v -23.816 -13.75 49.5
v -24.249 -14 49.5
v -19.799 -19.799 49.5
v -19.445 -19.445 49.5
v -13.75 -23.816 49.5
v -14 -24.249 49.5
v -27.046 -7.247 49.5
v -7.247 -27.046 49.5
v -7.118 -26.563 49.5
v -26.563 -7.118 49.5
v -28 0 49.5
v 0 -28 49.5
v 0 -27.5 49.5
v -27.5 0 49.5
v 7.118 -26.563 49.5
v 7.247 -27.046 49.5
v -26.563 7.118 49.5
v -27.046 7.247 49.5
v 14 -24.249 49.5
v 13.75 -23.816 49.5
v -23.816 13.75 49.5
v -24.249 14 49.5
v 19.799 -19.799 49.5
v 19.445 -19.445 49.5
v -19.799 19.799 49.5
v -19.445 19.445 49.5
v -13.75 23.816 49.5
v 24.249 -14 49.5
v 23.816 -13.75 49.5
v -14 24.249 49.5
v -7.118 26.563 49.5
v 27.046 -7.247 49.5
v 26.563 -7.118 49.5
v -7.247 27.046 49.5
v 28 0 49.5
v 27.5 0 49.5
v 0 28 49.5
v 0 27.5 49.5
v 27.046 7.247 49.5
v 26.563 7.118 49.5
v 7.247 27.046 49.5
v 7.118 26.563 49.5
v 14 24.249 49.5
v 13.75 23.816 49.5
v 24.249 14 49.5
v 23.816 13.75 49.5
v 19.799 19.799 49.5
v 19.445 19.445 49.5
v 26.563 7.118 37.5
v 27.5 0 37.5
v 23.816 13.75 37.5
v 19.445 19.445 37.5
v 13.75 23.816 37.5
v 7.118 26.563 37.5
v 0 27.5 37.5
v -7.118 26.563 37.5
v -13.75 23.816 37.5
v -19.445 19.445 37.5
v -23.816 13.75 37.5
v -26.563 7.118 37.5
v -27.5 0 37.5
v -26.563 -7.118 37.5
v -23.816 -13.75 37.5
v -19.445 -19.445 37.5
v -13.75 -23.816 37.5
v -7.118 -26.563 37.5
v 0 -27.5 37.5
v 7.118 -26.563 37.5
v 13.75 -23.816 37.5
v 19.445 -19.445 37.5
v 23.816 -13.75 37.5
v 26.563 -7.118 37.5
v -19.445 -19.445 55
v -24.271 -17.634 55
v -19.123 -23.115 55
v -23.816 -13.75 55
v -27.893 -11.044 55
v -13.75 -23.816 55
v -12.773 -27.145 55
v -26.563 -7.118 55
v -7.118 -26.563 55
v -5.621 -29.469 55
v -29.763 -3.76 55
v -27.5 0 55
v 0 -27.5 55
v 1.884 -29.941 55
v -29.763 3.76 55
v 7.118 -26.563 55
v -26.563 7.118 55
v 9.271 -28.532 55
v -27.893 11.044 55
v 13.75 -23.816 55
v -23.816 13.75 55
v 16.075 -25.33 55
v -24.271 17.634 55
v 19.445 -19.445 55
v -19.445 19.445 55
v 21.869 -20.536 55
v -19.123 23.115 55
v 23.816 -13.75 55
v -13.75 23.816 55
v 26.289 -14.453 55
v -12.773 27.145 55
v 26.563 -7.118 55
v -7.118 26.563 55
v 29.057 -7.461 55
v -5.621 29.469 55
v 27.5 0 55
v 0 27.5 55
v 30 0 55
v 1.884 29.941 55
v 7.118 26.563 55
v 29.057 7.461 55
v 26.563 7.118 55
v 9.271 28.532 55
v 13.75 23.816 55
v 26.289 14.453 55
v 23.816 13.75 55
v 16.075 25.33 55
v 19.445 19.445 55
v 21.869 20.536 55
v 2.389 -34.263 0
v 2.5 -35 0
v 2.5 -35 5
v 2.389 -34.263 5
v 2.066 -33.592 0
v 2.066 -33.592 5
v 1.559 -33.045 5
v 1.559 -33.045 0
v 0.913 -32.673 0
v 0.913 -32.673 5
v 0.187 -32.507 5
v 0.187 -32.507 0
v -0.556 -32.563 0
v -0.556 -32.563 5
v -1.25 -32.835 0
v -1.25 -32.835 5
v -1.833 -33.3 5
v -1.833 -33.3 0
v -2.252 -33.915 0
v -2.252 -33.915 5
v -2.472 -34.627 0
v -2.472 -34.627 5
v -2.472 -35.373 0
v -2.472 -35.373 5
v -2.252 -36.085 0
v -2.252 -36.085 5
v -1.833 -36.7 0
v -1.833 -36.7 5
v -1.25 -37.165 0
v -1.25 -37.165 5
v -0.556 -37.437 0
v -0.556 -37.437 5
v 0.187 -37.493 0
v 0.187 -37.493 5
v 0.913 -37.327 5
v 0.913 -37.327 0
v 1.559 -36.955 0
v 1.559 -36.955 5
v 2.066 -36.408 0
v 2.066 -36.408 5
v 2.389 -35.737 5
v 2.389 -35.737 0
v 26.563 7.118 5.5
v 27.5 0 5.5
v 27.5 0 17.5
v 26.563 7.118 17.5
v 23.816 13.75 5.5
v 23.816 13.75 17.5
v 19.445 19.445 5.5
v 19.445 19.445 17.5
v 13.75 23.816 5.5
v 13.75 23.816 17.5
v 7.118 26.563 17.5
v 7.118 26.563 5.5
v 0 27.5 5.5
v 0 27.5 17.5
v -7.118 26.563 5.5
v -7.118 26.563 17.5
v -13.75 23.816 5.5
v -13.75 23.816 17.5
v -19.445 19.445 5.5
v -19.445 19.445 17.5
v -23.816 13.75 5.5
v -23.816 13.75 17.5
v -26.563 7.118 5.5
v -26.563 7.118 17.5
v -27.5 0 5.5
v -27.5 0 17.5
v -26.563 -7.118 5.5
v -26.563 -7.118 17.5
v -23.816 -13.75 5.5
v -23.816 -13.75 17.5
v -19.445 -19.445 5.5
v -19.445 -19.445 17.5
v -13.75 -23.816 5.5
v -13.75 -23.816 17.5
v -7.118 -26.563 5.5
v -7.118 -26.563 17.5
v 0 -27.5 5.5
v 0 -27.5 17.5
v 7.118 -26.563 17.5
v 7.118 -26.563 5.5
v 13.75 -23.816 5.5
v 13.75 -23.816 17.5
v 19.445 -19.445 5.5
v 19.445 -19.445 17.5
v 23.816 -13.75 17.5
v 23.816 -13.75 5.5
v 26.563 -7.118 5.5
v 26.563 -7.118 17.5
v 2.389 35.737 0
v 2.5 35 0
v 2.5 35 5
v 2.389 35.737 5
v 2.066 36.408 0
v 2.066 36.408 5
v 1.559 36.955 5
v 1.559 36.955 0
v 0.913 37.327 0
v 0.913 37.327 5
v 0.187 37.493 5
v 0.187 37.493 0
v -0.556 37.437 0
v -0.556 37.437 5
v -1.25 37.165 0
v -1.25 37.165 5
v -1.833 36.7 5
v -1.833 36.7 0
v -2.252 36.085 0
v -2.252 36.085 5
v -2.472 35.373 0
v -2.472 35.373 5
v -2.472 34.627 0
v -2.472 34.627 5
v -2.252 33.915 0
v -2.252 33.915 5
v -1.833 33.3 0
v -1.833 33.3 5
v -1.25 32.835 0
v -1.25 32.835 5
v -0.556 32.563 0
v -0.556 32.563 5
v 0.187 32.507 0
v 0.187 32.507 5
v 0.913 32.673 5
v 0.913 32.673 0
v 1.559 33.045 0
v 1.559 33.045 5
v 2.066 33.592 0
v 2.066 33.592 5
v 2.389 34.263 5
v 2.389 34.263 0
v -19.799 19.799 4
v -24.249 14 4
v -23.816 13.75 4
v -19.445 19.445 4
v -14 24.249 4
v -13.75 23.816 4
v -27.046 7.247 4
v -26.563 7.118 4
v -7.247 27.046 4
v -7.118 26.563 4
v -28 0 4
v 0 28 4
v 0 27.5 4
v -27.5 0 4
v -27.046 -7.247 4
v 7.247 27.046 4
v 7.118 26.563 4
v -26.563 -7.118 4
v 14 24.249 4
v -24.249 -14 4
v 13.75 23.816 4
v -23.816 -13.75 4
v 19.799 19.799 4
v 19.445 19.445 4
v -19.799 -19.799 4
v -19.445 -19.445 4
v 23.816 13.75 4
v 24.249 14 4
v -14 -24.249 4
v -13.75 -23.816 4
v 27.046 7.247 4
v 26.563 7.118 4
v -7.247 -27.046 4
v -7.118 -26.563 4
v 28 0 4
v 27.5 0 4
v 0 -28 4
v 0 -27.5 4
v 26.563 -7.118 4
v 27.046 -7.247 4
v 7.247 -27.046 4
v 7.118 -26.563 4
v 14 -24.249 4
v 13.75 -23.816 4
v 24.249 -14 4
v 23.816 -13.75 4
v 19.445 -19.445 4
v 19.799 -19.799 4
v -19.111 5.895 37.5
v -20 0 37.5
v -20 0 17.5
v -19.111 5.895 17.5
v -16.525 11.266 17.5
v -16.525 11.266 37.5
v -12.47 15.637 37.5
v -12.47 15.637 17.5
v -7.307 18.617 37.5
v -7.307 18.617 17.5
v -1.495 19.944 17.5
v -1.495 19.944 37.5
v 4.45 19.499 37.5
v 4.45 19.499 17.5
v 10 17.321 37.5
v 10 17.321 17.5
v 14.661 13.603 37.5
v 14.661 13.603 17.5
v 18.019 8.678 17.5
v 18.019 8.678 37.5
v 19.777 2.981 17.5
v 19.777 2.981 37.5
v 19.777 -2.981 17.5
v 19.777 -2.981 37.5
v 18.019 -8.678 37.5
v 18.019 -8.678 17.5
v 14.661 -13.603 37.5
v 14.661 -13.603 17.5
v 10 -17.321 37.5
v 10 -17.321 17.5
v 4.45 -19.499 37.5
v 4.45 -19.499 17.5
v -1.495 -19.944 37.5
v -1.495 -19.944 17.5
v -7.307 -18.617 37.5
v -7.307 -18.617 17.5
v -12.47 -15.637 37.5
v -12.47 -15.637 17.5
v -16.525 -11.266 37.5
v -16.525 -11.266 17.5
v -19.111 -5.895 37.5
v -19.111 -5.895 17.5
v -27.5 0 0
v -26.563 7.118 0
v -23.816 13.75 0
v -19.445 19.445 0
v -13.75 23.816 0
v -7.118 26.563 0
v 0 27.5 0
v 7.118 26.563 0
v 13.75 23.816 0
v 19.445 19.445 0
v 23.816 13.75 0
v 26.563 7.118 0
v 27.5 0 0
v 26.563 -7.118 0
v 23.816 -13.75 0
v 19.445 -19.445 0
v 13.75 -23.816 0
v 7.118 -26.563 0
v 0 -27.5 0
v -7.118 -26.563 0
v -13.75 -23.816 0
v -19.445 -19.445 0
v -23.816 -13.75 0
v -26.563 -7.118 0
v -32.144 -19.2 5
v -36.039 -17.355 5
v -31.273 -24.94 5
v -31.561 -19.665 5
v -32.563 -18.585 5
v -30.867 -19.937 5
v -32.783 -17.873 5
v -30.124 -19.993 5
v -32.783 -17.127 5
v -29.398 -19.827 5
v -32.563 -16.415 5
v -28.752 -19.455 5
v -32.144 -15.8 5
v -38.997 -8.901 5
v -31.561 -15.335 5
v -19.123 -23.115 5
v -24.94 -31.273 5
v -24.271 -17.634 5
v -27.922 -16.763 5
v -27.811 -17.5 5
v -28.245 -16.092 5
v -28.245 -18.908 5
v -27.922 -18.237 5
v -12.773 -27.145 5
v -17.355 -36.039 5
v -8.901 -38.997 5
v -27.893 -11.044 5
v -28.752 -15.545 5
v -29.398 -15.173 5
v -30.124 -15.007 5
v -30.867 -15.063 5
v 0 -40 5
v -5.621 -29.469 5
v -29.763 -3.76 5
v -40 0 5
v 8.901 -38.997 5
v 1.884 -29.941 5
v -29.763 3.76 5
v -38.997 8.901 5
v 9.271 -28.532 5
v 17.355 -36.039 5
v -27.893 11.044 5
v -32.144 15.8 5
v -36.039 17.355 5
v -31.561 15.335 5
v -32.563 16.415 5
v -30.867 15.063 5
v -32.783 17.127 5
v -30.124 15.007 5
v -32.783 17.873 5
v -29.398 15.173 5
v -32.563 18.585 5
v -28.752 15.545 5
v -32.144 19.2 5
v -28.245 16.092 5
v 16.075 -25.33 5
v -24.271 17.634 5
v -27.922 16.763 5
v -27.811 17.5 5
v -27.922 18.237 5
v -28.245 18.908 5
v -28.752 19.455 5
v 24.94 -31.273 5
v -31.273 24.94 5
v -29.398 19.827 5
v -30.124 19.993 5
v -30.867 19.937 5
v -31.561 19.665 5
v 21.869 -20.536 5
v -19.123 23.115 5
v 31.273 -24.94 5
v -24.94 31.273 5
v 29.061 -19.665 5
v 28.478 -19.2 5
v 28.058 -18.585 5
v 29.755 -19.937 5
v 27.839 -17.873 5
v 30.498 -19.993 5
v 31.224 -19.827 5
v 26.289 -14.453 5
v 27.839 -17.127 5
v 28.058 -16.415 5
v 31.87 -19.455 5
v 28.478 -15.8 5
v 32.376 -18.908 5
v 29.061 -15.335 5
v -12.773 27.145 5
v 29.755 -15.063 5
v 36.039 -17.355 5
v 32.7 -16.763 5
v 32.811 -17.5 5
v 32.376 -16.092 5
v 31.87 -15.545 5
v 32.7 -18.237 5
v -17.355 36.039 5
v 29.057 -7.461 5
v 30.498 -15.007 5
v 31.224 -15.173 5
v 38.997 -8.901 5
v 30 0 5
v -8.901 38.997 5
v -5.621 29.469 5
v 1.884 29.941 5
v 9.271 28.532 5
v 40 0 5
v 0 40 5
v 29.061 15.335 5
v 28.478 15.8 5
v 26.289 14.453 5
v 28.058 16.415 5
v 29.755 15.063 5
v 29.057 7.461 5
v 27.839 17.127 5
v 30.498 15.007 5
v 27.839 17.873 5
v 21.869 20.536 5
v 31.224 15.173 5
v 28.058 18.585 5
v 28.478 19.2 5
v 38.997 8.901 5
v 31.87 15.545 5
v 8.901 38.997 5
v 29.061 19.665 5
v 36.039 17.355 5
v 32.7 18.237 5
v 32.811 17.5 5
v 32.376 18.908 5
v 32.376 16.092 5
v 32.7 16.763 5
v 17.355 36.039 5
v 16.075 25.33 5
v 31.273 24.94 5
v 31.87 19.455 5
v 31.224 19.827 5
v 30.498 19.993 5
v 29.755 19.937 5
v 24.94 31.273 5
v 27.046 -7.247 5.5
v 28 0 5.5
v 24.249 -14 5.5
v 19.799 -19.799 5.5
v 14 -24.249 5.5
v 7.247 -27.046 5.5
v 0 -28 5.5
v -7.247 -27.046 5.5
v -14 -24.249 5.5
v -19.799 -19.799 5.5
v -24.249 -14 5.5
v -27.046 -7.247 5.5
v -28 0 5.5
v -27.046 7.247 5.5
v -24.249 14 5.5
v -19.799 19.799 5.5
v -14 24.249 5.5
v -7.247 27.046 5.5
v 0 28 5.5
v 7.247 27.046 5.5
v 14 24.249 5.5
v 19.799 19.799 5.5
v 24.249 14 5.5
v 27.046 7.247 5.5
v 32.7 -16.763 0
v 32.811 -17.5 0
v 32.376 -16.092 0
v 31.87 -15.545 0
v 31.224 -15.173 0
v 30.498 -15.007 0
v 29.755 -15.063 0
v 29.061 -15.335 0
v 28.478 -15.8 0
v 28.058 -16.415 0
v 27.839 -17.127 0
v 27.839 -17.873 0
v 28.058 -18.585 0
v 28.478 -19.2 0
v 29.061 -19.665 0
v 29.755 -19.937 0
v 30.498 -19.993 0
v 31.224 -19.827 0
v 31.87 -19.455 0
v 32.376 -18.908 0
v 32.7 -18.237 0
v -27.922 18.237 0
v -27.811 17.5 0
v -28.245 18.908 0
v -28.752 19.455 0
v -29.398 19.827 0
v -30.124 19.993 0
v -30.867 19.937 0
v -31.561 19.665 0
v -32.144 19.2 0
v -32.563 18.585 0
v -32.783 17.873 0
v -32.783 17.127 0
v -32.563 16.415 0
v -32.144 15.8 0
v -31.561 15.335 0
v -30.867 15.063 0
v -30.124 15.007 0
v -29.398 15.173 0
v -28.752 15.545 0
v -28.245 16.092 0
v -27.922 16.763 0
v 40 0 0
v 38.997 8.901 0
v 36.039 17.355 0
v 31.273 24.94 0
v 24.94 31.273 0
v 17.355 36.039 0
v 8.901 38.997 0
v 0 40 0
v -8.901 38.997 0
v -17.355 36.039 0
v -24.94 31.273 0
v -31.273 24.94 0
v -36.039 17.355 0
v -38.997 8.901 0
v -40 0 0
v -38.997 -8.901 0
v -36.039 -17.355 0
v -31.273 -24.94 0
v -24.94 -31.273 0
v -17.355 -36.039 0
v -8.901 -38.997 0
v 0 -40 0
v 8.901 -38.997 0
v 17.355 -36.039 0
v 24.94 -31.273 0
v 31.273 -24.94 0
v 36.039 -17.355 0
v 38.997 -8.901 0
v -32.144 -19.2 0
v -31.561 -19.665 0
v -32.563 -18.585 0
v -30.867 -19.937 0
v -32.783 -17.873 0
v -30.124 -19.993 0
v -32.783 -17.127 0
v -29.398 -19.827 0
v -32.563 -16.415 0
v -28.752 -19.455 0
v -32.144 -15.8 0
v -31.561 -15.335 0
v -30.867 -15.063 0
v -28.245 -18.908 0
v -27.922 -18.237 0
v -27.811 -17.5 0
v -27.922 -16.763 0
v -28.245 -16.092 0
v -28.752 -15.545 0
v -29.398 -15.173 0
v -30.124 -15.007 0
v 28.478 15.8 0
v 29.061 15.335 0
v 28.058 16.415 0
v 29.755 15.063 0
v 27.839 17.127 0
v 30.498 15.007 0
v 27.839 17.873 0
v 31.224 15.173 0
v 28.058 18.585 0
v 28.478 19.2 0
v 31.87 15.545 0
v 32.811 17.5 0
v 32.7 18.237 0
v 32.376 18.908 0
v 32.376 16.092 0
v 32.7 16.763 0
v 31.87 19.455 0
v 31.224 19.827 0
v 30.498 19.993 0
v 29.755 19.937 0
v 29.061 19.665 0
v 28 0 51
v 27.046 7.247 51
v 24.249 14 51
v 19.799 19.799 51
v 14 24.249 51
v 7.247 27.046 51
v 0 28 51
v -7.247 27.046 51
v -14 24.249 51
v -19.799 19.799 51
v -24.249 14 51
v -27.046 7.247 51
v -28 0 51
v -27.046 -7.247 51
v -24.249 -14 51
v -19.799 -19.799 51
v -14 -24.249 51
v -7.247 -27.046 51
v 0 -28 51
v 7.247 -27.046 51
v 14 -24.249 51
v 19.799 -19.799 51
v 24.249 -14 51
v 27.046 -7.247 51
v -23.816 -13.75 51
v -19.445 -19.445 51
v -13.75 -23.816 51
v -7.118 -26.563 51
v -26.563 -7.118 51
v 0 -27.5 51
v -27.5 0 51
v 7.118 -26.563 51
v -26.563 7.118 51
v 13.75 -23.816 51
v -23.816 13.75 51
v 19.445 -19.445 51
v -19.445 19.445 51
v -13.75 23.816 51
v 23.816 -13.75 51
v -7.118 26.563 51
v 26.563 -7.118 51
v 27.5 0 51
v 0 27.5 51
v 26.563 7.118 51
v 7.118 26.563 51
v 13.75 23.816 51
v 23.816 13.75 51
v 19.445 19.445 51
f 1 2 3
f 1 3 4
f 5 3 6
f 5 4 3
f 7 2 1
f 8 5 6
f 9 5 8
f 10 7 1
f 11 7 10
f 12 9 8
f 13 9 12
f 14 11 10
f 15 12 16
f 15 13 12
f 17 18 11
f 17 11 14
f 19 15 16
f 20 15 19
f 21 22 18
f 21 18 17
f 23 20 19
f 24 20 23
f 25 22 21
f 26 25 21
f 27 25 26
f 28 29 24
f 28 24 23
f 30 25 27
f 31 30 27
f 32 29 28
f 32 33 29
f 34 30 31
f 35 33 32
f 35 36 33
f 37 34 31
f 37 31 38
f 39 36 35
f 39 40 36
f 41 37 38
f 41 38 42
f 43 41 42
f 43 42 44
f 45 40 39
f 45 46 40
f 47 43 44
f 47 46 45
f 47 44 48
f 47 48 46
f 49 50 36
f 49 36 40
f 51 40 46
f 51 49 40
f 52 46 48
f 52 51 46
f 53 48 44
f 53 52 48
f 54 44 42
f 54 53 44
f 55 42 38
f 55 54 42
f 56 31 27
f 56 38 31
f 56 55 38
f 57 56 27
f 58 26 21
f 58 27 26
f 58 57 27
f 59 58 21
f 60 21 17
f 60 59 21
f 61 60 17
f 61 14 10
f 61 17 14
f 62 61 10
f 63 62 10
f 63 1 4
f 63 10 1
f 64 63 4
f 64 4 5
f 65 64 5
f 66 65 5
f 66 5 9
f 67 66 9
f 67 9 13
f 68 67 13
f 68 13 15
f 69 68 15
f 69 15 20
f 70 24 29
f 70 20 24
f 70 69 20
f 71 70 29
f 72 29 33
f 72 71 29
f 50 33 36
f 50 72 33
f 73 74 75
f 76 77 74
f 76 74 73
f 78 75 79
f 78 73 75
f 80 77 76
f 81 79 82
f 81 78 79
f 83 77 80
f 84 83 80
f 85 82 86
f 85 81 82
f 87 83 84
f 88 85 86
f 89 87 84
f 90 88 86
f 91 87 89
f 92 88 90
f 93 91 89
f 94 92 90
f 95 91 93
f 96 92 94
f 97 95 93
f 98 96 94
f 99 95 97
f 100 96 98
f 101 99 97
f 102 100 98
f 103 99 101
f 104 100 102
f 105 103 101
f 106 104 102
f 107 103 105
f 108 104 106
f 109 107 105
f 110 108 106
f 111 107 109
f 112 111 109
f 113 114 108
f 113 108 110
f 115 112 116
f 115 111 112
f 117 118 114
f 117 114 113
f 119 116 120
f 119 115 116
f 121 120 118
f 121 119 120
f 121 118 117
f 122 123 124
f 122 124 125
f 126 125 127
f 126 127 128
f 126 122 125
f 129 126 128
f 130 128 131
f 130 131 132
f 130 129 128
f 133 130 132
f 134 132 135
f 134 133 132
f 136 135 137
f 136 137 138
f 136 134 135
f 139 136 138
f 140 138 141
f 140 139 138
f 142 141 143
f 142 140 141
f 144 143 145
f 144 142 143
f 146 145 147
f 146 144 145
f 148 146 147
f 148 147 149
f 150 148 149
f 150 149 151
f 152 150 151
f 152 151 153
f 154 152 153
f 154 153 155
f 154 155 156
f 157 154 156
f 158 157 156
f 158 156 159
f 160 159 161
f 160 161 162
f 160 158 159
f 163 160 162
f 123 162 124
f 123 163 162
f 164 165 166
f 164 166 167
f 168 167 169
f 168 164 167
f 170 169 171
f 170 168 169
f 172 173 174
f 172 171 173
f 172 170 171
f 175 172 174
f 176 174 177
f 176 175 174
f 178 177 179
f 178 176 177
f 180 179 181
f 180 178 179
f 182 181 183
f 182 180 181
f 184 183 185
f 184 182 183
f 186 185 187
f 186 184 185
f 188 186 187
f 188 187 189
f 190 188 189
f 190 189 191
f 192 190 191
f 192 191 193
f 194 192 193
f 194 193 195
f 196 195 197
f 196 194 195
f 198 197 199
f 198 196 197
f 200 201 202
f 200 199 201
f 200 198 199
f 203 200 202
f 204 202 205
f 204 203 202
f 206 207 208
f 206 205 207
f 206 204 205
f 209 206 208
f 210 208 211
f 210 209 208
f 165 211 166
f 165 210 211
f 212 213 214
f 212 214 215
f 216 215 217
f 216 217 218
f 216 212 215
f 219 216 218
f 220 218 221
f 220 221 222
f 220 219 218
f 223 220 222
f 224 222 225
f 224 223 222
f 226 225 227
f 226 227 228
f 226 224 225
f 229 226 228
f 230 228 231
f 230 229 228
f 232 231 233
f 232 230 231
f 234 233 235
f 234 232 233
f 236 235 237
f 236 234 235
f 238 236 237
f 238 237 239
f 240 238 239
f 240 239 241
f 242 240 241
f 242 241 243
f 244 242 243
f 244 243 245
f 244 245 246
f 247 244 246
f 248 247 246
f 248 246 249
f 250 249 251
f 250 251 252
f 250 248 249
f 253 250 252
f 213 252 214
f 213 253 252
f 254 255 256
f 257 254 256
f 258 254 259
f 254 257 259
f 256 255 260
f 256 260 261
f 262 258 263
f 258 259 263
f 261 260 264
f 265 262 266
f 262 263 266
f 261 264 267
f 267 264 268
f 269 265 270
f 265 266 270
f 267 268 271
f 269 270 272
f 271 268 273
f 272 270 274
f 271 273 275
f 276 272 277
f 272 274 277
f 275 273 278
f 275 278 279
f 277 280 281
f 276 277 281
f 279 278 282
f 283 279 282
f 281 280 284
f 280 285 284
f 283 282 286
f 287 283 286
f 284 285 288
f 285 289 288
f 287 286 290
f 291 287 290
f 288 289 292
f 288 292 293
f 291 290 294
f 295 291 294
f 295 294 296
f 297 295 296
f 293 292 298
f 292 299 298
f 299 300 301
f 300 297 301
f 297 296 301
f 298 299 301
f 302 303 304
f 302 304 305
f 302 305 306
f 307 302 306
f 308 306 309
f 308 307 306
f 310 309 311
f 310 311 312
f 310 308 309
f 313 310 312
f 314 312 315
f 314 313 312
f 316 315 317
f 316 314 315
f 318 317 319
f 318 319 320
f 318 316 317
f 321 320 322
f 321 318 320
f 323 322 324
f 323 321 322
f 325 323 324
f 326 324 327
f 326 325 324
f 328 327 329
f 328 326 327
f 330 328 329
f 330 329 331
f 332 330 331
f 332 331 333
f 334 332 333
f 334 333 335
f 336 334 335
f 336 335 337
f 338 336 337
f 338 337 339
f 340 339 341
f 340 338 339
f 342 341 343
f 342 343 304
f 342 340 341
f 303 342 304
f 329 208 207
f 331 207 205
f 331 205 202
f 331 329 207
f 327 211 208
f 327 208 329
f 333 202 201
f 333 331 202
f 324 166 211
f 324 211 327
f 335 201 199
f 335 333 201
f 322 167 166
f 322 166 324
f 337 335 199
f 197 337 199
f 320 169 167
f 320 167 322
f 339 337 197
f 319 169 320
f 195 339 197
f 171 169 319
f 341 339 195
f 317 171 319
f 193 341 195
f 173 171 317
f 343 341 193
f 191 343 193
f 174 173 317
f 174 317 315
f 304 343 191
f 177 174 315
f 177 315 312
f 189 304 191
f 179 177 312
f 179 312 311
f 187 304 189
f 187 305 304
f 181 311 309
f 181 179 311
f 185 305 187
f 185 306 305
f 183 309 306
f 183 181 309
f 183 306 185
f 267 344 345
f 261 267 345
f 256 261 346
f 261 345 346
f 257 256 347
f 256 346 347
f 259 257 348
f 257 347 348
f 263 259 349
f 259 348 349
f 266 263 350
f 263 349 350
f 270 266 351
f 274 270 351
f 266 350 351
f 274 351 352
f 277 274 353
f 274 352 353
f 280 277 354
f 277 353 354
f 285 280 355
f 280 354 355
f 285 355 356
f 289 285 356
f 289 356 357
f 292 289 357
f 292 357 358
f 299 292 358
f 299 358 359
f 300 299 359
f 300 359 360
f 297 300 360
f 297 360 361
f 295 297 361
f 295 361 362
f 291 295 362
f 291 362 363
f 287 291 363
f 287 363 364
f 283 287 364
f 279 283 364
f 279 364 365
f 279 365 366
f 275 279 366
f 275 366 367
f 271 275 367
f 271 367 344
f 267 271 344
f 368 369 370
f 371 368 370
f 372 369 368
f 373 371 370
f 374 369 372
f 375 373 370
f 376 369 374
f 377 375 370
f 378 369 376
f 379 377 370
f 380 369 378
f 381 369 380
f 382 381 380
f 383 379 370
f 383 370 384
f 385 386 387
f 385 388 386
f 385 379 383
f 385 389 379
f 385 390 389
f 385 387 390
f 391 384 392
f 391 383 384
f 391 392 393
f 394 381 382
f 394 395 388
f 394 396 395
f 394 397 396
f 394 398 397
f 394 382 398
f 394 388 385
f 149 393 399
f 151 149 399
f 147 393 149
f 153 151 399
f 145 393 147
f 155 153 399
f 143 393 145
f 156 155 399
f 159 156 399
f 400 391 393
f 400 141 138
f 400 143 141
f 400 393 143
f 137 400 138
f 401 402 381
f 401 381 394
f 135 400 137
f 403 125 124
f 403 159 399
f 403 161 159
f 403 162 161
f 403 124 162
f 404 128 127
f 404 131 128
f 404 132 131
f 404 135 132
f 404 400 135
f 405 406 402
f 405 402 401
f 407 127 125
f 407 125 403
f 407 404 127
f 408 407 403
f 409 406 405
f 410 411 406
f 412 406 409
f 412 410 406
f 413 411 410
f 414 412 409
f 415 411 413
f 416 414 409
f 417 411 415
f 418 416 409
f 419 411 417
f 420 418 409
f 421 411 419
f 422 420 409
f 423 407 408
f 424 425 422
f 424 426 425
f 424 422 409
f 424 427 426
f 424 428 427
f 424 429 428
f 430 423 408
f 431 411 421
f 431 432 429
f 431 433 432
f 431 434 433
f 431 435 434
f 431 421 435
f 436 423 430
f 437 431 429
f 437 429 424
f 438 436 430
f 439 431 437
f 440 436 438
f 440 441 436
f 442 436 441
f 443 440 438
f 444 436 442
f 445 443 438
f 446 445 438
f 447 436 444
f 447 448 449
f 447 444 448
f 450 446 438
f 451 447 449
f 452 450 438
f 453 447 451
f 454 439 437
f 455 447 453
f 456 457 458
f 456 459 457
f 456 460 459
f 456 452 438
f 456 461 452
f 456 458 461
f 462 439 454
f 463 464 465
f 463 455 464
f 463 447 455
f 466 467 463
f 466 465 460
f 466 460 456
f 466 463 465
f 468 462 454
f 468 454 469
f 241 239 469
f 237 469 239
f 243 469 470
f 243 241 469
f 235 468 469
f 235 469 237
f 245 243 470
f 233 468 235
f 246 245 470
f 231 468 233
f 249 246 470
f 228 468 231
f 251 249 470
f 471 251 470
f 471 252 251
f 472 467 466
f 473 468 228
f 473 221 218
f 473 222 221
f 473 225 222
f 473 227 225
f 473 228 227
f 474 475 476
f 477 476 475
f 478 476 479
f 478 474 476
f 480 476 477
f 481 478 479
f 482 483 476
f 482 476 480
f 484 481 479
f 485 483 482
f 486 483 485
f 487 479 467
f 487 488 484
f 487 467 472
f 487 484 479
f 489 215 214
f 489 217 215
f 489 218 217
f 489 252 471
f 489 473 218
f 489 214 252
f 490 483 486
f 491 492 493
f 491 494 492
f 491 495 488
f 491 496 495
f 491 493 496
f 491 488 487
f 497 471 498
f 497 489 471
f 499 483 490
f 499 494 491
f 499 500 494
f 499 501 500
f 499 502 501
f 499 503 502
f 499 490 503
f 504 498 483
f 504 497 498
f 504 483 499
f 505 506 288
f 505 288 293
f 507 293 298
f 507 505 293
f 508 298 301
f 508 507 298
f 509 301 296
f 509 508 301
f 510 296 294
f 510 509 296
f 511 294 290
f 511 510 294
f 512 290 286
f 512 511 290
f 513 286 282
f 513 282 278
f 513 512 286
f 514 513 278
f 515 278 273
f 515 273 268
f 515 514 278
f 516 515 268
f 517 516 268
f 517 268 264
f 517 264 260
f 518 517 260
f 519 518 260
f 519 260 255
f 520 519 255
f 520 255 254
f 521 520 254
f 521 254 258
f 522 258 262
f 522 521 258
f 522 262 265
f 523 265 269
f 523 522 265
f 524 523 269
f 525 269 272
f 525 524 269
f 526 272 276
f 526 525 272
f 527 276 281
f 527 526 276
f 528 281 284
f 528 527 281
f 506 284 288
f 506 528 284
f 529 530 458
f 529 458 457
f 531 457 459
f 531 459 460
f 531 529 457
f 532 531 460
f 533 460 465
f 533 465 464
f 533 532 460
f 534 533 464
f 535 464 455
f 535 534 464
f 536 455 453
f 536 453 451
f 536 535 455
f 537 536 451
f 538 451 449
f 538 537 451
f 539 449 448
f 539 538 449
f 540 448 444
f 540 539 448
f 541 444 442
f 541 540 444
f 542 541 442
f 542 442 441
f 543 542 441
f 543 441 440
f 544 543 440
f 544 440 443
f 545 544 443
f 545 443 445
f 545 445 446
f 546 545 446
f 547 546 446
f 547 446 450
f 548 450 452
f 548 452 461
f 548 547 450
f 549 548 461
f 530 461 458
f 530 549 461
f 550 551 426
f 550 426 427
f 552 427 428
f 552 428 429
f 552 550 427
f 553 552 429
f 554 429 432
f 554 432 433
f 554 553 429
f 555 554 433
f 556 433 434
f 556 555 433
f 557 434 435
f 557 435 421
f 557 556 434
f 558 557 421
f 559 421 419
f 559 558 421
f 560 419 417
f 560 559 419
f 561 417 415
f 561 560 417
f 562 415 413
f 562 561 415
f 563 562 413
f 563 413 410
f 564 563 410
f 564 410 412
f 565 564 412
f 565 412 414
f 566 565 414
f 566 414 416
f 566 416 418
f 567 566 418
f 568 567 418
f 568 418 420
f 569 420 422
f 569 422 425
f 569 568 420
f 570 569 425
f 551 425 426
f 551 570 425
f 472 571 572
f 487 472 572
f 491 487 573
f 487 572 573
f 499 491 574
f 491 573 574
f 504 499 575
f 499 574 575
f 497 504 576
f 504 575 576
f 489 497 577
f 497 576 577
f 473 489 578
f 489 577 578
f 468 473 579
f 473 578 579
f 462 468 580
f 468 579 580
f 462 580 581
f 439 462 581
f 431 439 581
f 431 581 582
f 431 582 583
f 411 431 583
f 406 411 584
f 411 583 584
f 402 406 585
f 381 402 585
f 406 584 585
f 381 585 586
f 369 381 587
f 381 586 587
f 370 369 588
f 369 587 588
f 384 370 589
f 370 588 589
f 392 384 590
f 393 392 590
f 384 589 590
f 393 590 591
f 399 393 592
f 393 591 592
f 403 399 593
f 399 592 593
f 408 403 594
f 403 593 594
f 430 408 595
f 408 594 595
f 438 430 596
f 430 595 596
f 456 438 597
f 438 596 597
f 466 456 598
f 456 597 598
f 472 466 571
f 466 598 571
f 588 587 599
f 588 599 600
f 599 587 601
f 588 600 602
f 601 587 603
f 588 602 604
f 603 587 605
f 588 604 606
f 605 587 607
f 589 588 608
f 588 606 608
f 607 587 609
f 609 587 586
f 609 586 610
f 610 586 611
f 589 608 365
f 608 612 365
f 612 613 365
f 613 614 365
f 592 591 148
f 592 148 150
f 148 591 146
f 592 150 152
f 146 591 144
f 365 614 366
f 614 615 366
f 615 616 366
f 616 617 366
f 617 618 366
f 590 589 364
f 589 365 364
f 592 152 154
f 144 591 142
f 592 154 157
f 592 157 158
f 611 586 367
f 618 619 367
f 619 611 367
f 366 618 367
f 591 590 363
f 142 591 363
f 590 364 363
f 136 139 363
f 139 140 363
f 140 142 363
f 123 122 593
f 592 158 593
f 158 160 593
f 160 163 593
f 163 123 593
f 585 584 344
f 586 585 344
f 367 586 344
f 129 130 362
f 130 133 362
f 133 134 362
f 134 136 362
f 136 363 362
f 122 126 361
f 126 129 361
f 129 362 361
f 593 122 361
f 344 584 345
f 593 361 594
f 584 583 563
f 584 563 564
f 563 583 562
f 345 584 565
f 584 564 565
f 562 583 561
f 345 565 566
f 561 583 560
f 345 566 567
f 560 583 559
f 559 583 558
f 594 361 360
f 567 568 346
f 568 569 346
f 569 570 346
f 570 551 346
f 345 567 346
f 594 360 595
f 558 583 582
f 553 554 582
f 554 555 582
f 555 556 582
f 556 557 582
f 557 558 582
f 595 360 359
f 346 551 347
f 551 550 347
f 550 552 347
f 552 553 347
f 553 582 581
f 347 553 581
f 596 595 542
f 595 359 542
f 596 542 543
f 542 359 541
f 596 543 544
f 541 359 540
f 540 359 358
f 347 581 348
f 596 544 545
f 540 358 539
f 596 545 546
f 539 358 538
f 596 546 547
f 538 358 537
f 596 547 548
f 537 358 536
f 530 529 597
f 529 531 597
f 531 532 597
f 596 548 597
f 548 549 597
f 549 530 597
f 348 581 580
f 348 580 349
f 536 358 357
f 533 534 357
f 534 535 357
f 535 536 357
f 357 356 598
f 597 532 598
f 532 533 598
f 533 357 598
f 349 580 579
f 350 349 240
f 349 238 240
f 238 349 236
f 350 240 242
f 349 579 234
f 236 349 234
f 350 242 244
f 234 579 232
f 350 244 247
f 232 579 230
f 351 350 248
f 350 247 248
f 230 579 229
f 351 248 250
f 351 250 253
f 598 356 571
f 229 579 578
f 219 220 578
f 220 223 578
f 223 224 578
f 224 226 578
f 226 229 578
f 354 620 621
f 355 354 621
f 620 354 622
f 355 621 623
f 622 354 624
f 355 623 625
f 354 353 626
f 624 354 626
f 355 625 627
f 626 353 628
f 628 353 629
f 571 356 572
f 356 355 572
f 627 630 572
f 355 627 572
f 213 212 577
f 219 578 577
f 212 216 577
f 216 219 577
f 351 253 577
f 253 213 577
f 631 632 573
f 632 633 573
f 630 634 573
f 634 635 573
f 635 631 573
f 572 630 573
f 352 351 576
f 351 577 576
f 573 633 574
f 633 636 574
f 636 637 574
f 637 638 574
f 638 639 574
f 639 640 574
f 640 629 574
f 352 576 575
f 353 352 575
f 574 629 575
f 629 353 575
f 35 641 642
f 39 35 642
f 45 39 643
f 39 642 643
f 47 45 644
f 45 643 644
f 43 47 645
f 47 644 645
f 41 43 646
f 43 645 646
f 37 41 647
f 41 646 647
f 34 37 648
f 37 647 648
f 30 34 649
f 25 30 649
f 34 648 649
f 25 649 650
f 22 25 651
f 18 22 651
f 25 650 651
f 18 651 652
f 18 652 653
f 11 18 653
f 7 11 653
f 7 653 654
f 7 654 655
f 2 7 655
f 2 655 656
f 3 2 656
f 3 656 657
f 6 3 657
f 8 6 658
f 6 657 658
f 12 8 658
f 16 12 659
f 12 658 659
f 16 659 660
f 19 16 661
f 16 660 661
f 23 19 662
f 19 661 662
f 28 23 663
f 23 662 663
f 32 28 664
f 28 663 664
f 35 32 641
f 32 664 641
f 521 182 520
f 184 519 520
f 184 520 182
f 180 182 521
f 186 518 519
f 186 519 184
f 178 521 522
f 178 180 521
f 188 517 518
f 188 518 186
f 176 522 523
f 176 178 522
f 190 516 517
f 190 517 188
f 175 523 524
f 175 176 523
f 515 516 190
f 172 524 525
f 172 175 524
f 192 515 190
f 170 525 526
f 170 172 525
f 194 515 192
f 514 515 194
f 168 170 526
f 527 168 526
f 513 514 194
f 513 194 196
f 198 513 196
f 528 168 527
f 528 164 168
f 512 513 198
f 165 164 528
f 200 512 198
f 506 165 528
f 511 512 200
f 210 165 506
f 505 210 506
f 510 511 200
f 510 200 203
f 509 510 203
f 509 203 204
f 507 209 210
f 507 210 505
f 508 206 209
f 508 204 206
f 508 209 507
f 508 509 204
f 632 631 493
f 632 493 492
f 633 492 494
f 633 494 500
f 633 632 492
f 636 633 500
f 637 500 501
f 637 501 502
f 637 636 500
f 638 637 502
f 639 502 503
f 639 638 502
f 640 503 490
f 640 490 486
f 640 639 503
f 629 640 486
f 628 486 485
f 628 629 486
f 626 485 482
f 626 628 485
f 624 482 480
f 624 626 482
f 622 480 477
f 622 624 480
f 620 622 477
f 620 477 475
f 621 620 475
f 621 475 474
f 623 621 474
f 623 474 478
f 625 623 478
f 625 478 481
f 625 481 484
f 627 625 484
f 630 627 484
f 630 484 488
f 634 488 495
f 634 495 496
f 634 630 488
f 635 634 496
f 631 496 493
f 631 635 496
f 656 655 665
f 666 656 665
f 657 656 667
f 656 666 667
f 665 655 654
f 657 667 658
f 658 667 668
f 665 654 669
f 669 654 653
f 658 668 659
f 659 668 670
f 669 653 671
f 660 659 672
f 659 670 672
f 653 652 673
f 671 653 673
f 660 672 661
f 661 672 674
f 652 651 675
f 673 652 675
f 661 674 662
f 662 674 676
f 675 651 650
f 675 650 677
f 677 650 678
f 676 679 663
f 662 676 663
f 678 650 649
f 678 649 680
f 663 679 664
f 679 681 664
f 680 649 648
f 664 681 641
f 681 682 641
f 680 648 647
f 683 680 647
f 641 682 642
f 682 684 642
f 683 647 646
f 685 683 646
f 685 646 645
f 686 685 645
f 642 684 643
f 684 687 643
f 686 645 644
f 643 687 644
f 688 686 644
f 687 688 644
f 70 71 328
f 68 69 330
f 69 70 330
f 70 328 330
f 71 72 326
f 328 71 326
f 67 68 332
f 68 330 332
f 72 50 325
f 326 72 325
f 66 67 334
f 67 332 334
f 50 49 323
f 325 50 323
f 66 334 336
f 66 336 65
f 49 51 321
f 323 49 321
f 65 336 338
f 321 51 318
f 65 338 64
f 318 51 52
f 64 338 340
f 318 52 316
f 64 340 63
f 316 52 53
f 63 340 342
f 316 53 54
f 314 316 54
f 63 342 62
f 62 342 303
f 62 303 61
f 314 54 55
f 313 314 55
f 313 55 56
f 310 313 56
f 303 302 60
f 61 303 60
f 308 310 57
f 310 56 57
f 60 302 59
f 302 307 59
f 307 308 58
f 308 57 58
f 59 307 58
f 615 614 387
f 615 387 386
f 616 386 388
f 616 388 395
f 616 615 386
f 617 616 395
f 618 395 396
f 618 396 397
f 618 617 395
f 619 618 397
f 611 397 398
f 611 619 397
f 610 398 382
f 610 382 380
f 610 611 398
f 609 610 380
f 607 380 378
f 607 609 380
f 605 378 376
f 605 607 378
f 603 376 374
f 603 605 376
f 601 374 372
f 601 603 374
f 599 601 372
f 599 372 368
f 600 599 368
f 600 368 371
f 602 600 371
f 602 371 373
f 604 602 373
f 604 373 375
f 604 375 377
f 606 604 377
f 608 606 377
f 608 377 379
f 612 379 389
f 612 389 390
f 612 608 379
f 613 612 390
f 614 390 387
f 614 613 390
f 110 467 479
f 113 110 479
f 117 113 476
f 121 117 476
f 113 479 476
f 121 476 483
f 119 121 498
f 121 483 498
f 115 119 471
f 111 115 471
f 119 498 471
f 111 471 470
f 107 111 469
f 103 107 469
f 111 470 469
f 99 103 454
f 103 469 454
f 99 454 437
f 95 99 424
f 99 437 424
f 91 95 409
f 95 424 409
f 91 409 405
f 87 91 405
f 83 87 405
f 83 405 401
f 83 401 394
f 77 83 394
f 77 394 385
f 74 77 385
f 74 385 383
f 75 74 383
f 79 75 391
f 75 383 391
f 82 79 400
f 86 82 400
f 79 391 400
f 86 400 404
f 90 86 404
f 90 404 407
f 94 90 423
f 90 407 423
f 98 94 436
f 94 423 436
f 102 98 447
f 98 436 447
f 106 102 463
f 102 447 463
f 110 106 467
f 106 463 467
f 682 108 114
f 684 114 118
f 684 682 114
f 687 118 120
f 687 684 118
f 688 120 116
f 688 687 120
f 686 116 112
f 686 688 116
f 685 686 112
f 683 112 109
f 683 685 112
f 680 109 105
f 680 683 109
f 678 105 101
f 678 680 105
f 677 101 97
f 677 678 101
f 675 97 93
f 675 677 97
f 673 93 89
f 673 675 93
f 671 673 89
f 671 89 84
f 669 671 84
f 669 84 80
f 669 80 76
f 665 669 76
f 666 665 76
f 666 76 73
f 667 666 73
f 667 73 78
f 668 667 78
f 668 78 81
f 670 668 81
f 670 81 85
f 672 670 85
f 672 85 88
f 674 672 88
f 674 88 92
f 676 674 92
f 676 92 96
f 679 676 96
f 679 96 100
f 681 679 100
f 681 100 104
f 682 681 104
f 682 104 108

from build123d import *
from build123d.topology import SkipClean

# Parameters (mm, degrees)
SKETCH1_R                = 40
SKETCH1_R_2              = 2.5
BOSS_EXTRUDE1_DEPTH      = 5
SKETCH2_R                = 30
SKETCH2_R_2              = 27.5
BOSS_EXTRUDE2_DEPTH      = 50
SKETCH3_R                = 27.5
CUT_EXTRUDE1_DEPTH       = 50
BOSS_EXTRUDE4_DEPTH      = 10
BOSS_EXTRUDE4_DEPTH_BACK = 10
SKETCH5_R                = 27.5
SKETCH5_R_2              = 20
CUT_EXTRUDE2_START       = 12
SKETCH6_R                = 28
CUT_EXTRUDE2_DEPTH       = 1.5
CUT_EXTRUDE3_START       = 13.5
SKETCH7_R                = 28
CUT_EXTRUDE3_DEPTH       = 1.5


with BuildPart() as part:
    # Sketch1 → Boss-Extrude1 (new body)
    with BuildSketch(Plane.XY):
        Circle(SKETCH1_R)
        with Locations((0, 35)):
            Circle(SKETCH1_R_2, mode=Mode.SUBTRACT)
        with Locations((30.310889132, 17.5)):
            Circle(SKETCH1_R_2, mode=Mode.SUBTRACT)
        with Locations((30.310889132, -17.5)):
            Circle(SKETCH1_R_2, mode=Mode.SUBTRACT)
        with Locations((0, -35)):
            Circle(SKETCH1_R_2, mode=Mode.SUBTRACT)
        with Locations((-30.310889132, -17.5)):
            Circle(SKETCH1_R_2, mode=Mode.SUBTRACT)
        with Locations((-30.310889132, 17.5)):
            Circle(SKETCH1_R_2, mode=Mode.SUBTRACT)
    extrude(amount=BOSS_EXTRUDE1_DEPTH)

    # Sketch2 → Boss-Extrude2 (add)
    with BuildSketch(Plane.XY.offset(5)):
        Circle(SKETCH2_R)
        Circle(SKETCH2_R_2, mode=Mode.SUBTRACT)
    extrude(amount=BOSS_EXTRUDE2_DEPTH)

    # Sketch3 → Cut-Extrude1 (cut)
    with SkipClean():  # the faces are left unmerged after this step: merging them gives an invalid solid
        with BuildSketch(Plane(origin=(0, 0, 0), x_dir=(-1, 0, 0), z_dir=(0, 0, -1))):
            Circle(SKETCH3_R)
        extrude(amount=-CUT_EXTRUDE1_DEPTH, mode=Mode.SUBTRACT)

    # Sketch5 → Boss-Extrude4 (add, two sides: drawn at the far end of the back side and taken through both)
    with BuildSketch(Plane(origin=(0, 0, 27.5), x_dir=(-1, 0, 0), z_dir=(0, 0, -1)).offset(-BOSS_EXTRUDE4_DEPTH_BACK)):
        Circle(SKETCH5_R)
        Circle(SKETCH5_R_2, mode=Mode.SUBTRACT)
    extrude(amount=BOSS_EXTRUDE4_DEPTH + BOSS_EXTRUDE4_DEPTH_BACK)

    # Sketch6 → Cut-Extrude2 (cut)
    with BuildSketch(Plane(origin=(0, 0, 17.5), x_dir=(-1, 0, 0), z_dir=(0, 0, -1)).offset(CUT_EXTRUDE2_START)):
        with Locations(Location((0, 0, 0), (0, 0, 180))):
            Circle(SKETCH6_R)
    extrude(amount=CUT_EXTRUDE2_DEPTH, mode=Mode.SUBTRACT)

    # Sketch7 → Cut-Extrude3 (cut)
    with BuildSketch(Plane.XY.offset(37.5).offset(CUT_EXTRUDE3_START)):
        Circle(SKETCH7_R)
    extrude(amount=-CUT_EXTRUDE3_DEPTH, mode=Mode.SUBTRACT)


solid = part.part
